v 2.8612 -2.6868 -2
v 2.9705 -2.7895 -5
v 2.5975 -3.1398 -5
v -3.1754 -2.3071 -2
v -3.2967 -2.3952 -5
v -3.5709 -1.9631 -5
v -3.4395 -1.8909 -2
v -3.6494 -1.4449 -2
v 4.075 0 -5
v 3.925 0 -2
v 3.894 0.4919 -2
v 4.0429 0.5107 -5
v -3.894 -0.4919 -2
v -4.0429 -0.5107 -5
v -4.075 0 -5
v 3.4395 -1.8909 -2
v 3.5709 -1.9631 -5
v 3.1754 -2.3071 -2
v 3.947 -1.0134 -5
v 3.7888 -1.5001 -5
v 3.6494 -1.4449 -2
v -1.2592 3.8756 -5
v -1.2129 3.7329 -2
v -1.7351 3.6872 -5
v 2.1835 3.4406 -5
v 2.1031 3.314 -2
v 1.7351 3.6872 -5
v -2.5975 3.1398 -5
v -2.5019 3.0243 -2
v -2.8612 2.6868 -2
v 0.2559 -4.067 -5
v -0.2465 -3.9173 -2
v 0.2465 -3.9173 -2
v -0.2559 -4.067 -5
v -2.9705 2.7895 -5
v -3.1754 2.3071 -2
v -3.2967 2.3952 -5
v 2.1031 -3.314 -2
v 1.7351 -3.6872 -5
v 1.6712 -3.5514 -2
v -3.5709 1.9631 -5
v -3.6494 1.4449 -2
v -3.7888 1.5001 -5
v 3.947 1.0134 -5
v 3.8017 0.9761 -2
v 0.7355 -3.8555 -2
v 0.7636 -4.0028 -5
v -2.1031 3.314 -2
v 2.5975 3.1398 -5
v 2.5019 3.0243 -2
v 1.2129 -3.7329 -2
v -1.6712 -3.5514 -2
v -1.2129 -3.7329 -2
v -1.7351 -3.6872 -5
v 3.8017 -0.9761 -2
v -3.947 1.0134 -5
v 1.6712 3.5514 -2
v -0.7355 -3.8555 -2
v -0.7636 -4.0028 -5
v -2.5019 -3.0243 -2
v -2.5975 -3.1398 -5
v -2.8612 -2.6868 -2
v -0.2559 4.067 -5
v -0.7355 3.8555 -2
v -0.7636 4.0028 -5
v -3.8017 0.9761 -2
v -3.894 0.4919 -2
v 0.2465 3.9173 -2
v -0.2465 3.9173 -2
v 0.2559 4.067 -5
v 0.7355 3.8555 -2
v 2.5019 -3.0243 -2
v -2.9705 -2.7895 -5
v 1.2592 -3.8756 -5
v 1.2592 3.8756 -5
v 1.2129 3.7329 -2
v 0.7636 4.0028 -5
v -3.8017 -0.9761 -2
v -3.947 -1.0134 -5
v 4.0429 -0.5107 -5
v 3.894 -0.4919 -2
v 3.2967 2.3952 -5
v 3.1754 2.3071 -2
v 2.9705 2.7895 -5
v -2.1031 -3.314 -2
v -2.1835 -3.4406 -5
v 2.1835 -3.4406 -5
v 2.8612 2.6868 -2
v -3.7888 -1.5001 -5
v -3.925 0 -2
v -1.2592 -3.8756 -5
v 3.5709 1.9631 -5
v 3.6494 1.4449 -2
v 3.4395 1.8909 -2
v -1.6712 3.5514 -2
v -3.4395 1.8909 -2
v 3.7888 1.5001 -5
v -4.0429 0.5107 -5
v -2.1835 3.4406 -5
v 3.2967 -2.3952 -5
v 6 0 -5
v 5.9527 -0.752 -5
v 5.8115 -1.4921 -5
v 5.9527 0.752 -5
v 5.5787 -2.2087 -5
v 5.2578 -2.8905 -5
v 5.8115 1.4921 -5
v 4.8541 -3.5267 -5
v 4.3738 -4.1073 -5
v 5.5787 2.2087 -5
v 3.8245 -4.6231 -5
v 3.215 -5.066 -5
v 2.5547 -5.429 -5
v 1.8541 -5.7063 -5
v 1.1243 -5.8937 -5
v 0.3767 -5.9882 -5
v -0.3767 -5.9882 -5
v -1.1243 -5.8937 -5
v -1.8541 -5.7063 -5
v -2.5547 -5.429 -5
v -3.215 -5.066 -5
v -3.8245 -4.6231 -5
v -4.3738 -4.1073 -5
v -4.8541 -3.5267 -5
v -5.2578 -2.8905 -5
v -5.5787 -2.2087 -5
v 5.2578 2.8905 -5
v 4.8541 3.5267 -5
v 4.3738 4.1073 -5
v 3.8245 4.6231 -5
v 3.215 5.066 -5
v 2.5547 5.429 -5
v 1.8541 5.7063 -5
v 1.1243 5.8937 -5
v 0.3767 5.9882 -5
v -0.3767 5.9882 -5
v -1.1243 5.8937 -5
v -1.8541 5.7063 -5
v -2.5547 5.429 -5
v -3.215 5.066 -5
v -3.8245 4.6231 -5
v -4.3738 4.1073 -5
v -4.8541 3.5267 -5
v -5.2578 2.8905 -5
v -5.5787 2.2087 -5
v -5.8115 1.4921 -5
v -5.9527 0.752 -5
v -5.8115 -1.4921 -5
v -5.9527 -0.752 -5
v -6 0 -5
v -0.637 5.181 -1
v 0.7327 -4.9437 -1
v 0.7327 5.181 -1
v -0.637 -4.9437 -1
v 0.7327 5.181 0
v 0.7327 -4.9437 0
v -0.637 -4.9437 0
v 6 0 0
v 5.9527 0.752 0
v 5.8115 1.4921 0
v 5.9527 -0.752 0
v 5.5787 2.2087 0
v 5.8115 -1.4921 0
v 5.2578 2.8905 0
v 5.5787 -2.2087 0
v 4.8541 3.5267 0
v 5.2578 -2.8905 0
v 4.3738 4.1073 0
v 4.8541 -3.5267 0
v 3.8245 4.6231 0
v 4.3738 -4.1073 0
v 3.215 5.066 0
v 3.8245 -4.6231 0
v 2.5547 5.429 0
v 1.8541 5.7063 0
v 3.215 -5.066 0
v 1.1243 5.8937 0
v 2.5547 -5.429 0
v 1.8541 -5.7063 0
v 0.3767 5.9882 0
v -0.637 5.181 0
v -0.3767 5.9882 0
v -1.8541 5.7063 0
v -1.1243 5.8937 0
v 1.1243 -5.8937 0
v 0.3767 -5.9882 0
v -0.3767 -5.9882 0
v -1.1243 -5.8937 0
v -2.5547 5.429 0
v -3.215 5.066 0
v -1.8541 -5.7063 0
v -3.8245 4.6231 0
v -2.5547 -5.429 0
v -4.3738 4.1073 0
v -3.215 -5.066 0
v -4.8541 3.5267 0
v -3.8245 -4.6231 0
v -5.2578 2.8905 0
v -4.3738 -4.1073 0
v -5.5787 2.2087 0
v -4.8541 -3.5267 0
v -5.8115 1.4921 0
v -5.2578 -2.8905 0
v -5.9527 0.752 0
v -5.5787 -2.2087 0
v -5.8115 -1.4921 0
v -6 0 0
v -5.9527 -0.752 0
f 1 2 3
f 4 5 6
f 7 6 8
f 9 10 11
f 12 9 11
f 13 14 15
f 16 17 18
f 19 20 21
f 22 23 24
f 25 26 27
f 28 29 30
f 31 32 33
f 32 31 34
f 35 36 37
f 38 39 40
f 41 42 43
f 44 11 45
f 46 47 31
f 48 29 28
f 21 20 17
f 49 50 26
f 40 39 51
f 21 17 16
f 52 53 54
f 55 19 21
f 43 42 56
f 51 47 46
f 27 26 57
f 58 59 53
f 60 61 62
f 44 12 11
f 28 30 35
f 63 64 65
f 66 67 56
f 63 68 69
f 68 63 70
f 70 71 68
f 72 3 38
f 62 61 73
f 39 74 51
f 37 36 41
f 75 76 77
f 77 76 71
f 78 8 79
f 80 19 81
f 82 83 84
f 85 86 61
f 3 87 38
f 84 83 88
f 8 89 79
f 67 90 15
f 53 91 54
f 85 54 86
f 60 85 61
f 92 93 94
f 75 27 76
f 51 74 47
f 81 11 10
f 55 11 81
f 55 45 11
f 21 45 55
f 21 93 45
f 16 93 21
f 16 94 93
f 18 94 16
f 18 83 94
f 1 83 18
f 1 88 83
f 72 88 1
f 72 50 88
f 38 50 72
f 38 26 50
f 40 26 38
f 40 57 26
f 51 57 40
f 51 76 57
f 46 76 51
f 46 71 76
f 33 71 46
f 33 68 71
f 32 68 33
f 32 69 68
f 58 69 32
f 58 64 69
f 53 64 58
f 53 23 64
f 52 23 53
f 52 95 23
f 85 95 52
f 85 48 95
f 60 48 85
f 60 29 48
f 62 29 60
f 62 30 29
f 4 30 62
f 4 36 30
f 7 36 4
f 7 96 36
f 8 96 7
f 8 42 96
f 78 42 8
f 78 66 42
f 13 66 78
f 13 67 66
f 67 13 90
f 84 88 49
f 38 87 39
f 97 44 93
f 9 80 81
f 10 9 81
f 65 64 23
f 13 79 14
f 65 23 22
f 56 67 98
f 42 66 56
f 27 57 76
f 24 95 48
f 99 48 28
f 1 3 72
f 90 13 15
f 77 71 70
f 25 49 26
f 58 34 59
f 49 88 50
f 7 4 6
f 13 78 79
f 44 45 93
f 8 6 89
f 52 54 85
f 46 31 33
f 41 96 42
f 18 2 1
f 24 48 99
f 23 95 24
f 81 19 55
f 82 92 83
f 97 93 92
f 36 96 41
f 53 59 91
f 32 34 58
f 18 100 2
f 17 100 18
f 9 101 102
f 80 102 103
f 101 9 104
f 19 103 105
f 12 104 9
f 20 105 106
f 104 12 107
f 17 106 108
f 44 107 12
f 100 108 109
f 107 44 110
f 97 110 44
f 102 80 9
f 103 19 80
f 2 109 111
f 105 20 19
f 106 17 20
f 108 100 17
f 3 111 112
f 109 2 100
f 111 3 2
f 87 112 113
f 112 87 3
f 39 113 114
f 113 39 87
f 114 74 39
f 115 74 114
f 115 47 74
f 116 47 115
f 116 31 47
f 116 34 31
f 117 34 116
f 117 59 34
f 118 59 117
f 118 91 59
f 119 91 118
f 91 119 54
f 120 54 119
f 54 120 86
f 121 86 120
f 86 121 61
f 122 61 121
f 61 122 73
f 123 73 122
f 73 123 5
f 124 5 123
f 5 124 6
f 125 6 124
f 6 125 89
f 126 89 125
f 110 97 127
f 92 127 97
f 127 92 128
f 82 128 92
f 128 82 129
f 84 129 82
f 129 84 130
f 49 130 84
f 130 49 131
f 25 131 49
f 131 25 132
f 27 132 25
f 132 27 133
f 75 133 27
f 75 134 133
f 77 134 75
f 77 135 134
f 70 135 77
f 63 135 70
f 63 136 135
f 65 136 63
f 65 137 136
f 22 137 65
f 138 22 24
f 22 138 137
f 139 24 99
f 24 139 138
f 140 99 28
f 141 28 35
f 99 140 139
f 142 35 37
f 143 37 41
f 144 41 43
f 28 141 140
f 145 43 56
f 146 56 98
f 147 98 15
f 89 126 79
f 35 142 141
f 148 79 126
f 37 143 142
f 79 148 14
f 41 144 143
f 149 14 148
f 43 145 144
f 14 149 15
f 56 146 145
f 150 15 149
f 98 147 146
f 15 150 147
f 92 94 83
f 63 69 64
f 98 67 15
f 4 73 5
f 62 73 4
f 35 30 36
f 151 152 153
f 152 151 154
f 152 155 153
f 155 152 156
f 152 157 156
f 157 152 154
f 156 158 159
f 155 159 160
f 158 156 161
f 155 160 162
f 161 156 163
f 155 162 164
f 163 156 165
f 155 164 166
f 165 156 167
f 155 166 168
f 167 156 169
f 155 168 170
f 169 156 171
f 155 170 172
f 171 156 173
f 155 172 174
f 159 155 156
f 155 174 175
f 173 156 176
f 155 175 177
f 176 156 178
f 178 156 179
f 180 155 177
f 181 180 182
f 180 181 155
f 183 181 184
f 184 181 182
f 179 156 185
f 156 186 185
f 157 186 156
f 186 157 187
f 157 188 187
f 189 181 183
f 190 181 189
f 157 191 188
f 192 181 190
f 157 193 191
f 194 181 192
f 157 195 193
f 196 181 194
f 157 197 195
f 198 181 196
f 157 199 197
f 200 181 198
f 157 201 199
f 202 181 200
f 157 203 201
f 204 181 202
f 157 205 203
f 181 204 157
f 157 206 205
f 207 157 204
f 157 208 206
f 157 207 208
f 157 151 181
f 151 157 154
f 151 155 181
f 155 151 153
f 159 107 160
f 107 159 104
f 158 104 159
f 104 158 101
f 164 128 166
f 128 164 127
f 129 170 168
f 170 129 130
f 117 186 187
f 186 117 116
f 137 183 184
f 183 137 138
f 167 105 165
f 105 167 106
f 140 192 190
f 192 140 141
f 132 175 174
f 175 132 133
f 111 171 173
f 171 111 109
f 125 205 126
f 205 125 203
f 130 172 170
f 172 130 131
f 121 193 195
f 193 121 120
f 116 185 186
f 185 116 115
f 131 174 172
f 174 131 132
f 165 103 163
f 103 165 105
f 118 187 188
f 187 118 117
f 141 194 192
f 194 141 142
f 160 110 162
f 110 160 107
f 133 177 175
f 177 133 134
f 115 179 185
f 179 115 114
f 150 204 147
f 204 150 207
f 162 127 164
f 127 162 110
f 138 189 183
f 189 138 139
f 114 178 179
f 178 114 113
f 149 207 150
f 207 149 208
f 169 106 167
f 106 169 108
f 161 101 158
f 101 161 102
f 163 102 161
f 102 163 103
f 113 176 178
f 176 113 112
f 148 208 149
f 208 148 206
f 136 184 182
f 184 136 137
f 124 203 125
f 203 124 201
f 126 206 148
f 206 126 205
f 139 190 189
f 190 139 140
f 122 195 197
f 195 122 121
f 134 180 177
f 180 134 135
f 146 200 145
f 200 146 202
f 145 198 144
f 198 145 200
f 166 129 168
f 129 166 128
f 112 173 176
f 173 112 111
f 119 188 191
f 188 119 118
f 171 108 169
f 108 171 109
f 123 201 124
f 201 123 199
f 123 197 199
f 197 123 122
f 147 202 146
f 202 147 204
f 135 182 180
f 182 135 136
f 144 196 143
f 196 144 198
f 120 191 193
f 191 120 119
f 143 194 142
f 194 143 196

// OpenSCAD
$fn = 50;

difference() {
	union() {
		translate(v = [0, 0, -5.0]) {
			cylinder(h = 5, r = 6.0);
		}
	}
	union() {
		#translate(v = [0, 0, -5.0]) {
			cylinder(h = 3, r1 = 4.075, r2 = 3.925);
		}
		translate(v = [0, 0, -1]) {
			linear_extrude(height = 1) {
				text(font = "Impact", halign = "center", size = 10, text = "I", valign = "center");
			}
		}
	}
}
